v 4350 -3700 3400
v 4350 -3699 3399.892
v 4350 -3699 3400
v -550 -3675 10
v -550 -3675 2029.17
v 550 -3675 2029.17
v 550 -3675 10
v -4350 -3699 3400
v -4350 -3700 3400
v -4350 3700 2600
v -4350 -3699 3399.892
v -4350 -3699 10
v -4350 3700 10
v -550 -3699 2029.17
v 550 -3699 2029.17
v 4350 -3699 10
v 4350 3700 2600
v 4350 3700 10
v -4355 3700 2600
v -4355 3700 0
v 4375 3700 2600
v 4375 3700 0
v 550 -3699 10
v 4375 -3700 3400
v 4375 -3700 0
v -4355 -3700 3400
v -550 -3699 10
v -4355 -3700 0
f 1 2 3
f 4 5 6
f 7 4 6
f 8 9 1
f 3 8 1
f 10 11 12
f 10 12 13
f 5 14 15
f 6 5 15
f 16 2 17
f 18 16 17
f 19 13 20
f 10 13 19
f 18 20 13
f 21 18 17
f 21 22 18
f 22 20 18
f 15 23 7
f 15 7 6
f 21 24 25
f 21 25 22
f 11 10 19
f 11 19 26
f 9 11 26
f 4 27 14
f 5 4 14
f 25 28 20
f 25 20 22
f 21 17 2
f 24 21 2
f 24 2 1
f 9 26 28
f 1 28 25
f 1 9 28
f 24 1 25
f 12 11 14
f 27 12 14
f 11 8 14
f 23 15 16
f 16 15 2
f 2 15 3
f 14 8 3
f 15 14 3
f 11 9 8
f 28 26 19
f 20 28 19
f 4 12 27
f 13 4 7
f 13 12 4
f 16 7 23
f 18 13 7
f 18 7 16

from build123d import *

# Parameters (mm, degrees)
F7_DEPTH  = 25
F0_W      = 8700
F0_H      = 7400
F8_DEPTH  = 10
F2_W      = 8700
F2_H      = 3400
F9_DEPTH  = 1
F12_DEPTH = 5
F13_W     = 1100
F13_H     = 2029.1695594788
F14_DEPTH = 25


with BuildPart() as f7:
    # F6 (on line) → F7 (new body)
    with BuildSketch(Plane.YZ.offset(4350)):
        Polygon((-3700, 3400), (-3700, 0), (3700, 0), (3700, 2600), align=None)
    extrude(amount=F7_DEPTH)

    # F0 (on Top) → F8 (join)
    with BuildSketch(Plane.XY):
        Rectangle(F0_W, F0_H)
    extrude(amount=F8_DEPTH)

    # F2 (on line) → F9 (join)
    with BuildSketch(Plane.XZ.offset(3700)):
        with Locations((0, 1700)):
            Rectangle(F2_W, F2_H)
    extrude(amount=-F9_DEPTH)

    # F11 (on face) → F12 (join)
    with BuildSketch(Plane.YZ.offset(-4350)):
        Polygon((-3700, 3400), (-3700, 0), (3700, 0), (3700, 2600), align=None)
    extrude(amount=-F12_DEPTH)

    # F13 (on face) → F14 (join)
    with BuildSketch(Plane.XZ.offset(3700)):
        with Locations((0, 1014.5847797394)):
            Rectangle(F13_W, F13_H)
    extrude(amount=-F14_DEPTH)


solid = f7.part
